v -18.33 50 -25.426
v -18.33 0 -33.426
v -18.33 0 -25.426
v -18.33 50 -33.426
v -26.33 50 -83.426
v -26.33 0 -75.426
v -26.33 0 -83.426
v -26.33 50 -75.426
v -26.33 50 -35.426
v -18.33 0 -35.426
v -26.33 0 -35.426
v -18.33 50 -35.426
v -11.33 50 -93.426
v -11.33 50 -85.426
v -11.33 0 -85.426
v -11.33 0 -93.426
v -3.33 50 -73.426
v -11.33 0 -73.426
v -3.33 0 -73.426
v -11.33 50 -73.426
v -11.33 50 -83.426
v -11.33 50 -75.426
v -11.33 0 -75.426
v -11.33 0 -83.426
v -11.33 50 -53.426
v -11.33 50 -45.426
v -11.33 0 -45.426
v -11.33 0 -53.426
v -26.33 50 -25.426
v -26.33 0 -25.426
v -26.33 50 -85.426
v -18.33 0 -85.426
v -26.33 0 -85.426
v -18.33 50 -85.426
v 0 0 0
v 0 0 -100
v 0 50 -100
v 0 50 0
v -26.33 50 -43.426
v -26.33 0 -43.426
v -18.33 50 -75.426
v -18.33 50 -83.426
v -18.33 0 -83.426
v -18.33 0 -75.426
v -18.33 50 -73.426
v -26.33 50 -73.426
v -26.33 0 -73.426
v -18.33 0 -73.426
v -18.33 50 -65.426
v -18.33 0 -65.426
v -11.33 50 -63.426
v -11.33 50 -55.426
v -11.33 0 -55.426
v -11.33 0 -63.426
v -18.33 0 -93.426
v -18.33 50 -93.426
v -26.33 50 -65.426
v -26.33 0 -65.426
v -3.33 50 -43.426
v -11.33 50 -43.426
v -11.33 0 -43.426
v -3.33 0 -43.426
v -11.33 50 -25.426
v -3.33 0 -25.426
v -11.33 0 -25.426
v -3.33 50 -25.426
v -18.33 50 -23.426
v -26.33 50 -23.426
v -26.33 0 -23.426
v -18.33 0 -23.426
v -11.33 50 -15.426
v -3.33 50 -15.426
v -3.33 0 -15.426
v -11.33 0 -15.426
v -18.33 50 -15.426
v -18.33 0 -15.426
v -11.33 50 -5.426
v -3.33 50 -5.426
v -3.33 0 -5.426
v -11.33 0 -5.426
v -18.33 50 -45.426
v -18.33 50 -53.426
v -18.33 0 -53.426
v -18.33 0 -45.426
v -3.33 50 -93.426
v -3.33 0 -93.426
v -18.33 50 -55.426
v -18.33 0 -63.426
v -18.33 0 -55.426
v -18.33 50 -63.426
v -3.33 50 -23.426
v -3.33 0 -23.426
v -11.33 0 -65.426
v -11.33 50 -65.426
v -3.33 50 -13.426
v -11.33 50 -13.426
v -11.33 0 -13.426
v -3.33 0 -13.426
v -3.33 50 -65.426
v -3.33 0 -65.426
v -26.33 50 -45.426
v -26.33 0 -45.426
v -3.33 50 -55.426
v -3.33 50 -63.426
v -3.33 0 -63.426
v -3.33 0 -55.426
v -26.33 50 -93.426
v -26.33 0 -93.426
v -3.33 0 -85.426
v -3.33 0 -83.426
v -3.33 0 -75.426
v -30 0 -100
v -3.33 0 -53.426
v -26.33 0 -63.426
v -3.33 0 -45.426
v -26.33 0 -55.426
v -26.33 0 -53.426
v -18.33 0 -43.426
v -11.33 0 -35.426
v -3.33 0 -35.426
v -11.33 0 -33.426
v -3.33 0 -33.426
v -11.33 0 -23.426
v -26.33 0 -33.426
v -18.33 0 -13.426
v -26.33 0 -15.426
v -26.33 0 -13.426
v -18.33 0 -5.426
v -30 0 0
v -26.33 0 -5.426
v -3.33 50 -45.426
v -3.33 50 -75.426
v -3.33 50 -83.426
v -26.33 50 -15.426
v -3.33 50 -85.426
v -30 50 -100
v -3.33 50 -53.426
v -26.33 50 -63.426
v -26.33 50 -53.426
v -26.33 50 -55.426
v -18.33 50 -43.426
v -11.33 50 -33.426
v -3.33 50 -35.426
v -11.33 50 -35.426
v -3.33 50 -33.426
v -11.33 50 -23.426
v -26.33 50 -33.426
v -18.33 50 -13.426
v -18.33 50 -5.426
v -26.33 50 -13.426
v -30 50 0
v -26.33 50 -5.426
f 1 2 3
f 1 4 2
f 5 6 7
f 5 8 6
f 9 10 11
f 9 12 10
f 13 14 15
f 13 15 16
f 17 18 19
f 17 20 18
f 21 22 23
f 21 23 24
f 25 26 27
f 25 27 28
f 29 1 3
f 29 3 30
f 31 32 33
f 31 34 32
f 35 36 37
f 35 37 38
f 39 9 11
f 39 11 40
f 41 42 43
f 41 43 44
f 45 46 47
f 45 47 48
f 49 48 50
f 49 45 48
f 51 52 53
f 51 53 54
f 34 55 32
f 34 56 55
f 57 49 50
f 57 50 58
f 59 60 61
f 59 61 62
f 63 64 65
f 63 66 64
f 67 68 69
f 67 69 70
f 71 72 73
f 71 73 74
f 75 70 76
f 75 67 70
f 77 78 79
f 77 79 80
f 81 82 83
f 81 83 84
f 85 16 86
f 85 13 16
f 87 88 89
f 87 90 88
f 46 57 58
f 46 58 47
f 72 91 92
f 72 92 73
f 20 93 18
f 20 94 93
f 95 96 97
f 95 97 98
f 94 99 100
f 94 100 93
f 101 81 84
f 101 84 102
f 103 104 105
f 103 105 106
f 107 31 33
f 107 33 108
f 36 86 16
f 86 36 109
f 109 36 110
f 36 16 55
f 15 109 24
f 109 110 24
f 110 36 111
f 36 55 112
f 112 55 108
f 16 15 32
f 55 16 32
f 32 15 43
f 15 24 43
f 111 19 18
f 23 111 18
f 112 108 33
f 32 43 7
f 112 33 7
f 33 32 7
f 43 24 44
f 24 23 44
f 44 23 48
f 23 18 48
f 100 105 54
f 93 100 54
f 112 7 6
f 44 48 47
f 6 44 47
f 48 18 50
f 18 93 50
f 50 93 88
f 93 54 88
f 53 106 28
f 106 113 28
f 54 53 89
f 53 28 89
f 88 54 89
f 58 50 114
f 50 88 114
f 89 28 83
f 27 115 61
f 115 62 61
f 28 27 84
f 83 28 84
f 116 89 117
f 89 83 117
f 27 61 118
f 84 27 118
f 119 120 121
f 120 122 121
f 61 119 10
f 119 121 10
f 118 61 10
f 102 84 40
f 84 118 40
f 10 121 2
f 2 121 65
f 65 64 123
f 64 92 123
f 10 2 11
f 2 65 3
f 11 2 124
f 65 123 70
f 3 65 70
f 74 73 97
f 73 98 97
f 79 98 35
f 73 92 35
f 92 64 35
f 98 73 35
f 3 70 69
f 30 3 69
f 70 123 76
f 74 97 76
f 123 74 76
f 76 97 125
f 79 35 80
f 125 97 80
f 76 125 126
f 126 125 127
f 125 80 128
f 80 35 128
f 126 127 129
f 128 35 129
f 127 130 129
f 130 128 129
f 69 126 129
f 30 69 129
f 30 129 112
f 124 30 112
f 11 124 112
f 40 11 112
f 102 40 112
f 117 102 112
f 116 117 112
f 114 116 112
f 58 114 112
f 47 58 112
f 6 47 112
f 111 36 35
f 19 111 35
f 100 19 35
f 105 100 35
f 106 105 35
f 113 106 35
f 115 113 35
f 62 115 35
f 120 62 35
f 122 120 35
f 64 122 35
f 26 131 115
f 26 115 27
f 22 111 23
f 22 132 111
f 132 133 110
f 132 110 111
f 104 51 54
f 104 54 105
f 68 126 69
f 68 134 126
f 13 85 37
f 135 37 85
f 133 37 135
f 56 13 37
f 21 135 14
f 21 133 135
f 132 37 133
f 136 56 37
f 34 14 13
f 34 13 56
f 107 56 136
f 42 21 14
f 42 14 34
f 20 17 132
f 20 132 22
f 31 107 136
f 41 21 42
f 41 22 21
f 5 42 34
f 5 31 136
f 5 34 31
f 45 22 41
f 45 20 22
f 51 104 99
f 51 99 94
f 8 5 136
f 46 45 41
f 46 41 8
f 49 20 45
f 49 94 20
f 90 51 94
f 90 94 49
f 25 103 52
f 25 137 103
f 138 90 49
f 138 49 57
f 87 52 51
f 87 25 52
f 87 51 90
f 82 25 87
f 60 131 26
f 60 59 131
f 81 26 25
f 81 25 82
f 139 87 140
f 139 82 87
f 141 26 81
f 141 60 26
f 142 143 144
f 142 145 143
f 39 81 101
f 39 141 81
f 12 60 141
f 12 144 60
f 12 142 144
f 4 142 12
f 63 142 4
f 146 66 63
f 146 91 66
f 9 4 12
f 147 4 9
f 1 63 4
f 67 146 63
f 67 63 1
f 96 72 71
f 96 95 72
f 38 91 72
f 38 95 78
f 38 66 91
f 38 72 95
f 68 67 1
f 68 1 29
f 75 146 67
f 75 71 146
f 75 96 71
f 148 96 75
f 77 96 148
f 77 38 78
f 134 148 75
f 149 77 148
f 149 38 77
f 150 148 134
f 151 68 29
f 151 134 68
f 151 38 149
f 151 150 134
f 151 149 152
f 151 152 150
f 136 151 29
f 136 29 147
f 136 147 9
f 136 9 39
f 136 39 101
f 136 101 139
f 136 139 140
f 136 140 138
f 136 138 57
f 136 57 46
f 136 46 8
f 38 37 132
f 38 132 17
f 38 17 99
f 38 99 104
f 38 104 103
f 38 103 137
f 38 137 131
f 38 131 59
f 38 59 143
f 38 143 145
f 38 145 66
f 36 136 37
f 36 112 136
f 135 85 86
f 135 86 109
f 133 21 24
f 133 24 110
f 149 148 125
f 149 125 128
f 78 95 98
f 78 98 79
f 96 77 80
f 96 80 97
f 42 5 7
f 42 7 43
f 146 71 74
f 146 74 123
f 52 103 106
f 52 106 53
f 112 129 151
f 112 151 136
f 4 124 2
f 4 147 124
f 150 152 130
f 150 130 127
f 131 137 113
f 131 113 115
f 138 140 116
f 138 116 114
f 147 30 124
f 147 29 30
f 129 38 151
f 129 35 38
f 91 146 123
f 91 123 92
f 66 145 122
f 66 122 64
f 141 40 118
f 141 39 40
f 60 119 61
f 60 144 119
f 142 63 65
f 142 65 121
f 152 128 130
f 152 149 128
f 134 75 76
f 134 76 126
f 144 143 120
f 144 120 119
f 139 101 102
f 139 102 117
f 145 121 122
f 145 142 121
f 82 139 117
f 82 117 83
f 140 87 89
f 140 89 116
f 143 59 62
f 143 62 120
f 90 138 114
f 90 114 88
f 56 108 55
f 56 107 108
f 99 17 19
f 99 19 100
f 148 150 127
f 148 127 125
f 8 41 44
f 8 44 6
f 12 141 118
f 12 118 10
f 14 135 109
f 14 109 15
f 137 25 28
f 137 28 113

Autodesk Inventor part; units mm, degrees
ref_plane "YZ Plane" through (0, 0, 0) normal (1, 0, 0) x (0, 1, 0)
ref_plane "XZ Plane" through (0, 0, 0) normal (0, 1, 0) x (-1, 0, 0)
ref_plane "XY Plane" through (0, 0, 0) normal (0, 0, 1) x (1, 0, 0)
sketch "草圖1" plane through (0, 0, 0) normal (0, 1, 0) x (-1, 0, 0)
  line L0 (0, 0) -> (30, 0)
  line L1 (30, 0) -> (30, -100)
  line L2 (30, -100) -> (0, -100)
  line L3 (0, -100) -> (0, 0)
  dimension "d0" = 30
  dimension "d1" = 100
extrude "擠出1" add sketch "草圖1" along normal blind 50
sketch "草圖2" plane through (0, 50, 0) normal (0, 1, 0) x (1, 0, 0)
  line L0 (-11.3304, 13.4262) -> (-3.3304, 13.4262)
  line L1 (-3.3304, 13.4262) -> (-3.3304, 5.4262)
  line L2 (-3.3304, 5.4262) -> (-11.3304, 5.4262)
  line L3 (-11.3304, 5.4262) -> (-11.3304, 13.4262)
  point P0 (0, 0)
  dimension "d4" = 8
  dimension "d5" = 8
extrude "擠出2" cut sketch "草圖2" against normal blind 50
pattern_linear "矩形陣列1" count 9 spacing 10 along (0, 0, -1) of "擠出2"
pattern_linear "矩形陣列2" count 2 spacing 15 along (-1, 0, 0) of "擠出2", "矩形陣列1"
properties part number "矩形陣列"
